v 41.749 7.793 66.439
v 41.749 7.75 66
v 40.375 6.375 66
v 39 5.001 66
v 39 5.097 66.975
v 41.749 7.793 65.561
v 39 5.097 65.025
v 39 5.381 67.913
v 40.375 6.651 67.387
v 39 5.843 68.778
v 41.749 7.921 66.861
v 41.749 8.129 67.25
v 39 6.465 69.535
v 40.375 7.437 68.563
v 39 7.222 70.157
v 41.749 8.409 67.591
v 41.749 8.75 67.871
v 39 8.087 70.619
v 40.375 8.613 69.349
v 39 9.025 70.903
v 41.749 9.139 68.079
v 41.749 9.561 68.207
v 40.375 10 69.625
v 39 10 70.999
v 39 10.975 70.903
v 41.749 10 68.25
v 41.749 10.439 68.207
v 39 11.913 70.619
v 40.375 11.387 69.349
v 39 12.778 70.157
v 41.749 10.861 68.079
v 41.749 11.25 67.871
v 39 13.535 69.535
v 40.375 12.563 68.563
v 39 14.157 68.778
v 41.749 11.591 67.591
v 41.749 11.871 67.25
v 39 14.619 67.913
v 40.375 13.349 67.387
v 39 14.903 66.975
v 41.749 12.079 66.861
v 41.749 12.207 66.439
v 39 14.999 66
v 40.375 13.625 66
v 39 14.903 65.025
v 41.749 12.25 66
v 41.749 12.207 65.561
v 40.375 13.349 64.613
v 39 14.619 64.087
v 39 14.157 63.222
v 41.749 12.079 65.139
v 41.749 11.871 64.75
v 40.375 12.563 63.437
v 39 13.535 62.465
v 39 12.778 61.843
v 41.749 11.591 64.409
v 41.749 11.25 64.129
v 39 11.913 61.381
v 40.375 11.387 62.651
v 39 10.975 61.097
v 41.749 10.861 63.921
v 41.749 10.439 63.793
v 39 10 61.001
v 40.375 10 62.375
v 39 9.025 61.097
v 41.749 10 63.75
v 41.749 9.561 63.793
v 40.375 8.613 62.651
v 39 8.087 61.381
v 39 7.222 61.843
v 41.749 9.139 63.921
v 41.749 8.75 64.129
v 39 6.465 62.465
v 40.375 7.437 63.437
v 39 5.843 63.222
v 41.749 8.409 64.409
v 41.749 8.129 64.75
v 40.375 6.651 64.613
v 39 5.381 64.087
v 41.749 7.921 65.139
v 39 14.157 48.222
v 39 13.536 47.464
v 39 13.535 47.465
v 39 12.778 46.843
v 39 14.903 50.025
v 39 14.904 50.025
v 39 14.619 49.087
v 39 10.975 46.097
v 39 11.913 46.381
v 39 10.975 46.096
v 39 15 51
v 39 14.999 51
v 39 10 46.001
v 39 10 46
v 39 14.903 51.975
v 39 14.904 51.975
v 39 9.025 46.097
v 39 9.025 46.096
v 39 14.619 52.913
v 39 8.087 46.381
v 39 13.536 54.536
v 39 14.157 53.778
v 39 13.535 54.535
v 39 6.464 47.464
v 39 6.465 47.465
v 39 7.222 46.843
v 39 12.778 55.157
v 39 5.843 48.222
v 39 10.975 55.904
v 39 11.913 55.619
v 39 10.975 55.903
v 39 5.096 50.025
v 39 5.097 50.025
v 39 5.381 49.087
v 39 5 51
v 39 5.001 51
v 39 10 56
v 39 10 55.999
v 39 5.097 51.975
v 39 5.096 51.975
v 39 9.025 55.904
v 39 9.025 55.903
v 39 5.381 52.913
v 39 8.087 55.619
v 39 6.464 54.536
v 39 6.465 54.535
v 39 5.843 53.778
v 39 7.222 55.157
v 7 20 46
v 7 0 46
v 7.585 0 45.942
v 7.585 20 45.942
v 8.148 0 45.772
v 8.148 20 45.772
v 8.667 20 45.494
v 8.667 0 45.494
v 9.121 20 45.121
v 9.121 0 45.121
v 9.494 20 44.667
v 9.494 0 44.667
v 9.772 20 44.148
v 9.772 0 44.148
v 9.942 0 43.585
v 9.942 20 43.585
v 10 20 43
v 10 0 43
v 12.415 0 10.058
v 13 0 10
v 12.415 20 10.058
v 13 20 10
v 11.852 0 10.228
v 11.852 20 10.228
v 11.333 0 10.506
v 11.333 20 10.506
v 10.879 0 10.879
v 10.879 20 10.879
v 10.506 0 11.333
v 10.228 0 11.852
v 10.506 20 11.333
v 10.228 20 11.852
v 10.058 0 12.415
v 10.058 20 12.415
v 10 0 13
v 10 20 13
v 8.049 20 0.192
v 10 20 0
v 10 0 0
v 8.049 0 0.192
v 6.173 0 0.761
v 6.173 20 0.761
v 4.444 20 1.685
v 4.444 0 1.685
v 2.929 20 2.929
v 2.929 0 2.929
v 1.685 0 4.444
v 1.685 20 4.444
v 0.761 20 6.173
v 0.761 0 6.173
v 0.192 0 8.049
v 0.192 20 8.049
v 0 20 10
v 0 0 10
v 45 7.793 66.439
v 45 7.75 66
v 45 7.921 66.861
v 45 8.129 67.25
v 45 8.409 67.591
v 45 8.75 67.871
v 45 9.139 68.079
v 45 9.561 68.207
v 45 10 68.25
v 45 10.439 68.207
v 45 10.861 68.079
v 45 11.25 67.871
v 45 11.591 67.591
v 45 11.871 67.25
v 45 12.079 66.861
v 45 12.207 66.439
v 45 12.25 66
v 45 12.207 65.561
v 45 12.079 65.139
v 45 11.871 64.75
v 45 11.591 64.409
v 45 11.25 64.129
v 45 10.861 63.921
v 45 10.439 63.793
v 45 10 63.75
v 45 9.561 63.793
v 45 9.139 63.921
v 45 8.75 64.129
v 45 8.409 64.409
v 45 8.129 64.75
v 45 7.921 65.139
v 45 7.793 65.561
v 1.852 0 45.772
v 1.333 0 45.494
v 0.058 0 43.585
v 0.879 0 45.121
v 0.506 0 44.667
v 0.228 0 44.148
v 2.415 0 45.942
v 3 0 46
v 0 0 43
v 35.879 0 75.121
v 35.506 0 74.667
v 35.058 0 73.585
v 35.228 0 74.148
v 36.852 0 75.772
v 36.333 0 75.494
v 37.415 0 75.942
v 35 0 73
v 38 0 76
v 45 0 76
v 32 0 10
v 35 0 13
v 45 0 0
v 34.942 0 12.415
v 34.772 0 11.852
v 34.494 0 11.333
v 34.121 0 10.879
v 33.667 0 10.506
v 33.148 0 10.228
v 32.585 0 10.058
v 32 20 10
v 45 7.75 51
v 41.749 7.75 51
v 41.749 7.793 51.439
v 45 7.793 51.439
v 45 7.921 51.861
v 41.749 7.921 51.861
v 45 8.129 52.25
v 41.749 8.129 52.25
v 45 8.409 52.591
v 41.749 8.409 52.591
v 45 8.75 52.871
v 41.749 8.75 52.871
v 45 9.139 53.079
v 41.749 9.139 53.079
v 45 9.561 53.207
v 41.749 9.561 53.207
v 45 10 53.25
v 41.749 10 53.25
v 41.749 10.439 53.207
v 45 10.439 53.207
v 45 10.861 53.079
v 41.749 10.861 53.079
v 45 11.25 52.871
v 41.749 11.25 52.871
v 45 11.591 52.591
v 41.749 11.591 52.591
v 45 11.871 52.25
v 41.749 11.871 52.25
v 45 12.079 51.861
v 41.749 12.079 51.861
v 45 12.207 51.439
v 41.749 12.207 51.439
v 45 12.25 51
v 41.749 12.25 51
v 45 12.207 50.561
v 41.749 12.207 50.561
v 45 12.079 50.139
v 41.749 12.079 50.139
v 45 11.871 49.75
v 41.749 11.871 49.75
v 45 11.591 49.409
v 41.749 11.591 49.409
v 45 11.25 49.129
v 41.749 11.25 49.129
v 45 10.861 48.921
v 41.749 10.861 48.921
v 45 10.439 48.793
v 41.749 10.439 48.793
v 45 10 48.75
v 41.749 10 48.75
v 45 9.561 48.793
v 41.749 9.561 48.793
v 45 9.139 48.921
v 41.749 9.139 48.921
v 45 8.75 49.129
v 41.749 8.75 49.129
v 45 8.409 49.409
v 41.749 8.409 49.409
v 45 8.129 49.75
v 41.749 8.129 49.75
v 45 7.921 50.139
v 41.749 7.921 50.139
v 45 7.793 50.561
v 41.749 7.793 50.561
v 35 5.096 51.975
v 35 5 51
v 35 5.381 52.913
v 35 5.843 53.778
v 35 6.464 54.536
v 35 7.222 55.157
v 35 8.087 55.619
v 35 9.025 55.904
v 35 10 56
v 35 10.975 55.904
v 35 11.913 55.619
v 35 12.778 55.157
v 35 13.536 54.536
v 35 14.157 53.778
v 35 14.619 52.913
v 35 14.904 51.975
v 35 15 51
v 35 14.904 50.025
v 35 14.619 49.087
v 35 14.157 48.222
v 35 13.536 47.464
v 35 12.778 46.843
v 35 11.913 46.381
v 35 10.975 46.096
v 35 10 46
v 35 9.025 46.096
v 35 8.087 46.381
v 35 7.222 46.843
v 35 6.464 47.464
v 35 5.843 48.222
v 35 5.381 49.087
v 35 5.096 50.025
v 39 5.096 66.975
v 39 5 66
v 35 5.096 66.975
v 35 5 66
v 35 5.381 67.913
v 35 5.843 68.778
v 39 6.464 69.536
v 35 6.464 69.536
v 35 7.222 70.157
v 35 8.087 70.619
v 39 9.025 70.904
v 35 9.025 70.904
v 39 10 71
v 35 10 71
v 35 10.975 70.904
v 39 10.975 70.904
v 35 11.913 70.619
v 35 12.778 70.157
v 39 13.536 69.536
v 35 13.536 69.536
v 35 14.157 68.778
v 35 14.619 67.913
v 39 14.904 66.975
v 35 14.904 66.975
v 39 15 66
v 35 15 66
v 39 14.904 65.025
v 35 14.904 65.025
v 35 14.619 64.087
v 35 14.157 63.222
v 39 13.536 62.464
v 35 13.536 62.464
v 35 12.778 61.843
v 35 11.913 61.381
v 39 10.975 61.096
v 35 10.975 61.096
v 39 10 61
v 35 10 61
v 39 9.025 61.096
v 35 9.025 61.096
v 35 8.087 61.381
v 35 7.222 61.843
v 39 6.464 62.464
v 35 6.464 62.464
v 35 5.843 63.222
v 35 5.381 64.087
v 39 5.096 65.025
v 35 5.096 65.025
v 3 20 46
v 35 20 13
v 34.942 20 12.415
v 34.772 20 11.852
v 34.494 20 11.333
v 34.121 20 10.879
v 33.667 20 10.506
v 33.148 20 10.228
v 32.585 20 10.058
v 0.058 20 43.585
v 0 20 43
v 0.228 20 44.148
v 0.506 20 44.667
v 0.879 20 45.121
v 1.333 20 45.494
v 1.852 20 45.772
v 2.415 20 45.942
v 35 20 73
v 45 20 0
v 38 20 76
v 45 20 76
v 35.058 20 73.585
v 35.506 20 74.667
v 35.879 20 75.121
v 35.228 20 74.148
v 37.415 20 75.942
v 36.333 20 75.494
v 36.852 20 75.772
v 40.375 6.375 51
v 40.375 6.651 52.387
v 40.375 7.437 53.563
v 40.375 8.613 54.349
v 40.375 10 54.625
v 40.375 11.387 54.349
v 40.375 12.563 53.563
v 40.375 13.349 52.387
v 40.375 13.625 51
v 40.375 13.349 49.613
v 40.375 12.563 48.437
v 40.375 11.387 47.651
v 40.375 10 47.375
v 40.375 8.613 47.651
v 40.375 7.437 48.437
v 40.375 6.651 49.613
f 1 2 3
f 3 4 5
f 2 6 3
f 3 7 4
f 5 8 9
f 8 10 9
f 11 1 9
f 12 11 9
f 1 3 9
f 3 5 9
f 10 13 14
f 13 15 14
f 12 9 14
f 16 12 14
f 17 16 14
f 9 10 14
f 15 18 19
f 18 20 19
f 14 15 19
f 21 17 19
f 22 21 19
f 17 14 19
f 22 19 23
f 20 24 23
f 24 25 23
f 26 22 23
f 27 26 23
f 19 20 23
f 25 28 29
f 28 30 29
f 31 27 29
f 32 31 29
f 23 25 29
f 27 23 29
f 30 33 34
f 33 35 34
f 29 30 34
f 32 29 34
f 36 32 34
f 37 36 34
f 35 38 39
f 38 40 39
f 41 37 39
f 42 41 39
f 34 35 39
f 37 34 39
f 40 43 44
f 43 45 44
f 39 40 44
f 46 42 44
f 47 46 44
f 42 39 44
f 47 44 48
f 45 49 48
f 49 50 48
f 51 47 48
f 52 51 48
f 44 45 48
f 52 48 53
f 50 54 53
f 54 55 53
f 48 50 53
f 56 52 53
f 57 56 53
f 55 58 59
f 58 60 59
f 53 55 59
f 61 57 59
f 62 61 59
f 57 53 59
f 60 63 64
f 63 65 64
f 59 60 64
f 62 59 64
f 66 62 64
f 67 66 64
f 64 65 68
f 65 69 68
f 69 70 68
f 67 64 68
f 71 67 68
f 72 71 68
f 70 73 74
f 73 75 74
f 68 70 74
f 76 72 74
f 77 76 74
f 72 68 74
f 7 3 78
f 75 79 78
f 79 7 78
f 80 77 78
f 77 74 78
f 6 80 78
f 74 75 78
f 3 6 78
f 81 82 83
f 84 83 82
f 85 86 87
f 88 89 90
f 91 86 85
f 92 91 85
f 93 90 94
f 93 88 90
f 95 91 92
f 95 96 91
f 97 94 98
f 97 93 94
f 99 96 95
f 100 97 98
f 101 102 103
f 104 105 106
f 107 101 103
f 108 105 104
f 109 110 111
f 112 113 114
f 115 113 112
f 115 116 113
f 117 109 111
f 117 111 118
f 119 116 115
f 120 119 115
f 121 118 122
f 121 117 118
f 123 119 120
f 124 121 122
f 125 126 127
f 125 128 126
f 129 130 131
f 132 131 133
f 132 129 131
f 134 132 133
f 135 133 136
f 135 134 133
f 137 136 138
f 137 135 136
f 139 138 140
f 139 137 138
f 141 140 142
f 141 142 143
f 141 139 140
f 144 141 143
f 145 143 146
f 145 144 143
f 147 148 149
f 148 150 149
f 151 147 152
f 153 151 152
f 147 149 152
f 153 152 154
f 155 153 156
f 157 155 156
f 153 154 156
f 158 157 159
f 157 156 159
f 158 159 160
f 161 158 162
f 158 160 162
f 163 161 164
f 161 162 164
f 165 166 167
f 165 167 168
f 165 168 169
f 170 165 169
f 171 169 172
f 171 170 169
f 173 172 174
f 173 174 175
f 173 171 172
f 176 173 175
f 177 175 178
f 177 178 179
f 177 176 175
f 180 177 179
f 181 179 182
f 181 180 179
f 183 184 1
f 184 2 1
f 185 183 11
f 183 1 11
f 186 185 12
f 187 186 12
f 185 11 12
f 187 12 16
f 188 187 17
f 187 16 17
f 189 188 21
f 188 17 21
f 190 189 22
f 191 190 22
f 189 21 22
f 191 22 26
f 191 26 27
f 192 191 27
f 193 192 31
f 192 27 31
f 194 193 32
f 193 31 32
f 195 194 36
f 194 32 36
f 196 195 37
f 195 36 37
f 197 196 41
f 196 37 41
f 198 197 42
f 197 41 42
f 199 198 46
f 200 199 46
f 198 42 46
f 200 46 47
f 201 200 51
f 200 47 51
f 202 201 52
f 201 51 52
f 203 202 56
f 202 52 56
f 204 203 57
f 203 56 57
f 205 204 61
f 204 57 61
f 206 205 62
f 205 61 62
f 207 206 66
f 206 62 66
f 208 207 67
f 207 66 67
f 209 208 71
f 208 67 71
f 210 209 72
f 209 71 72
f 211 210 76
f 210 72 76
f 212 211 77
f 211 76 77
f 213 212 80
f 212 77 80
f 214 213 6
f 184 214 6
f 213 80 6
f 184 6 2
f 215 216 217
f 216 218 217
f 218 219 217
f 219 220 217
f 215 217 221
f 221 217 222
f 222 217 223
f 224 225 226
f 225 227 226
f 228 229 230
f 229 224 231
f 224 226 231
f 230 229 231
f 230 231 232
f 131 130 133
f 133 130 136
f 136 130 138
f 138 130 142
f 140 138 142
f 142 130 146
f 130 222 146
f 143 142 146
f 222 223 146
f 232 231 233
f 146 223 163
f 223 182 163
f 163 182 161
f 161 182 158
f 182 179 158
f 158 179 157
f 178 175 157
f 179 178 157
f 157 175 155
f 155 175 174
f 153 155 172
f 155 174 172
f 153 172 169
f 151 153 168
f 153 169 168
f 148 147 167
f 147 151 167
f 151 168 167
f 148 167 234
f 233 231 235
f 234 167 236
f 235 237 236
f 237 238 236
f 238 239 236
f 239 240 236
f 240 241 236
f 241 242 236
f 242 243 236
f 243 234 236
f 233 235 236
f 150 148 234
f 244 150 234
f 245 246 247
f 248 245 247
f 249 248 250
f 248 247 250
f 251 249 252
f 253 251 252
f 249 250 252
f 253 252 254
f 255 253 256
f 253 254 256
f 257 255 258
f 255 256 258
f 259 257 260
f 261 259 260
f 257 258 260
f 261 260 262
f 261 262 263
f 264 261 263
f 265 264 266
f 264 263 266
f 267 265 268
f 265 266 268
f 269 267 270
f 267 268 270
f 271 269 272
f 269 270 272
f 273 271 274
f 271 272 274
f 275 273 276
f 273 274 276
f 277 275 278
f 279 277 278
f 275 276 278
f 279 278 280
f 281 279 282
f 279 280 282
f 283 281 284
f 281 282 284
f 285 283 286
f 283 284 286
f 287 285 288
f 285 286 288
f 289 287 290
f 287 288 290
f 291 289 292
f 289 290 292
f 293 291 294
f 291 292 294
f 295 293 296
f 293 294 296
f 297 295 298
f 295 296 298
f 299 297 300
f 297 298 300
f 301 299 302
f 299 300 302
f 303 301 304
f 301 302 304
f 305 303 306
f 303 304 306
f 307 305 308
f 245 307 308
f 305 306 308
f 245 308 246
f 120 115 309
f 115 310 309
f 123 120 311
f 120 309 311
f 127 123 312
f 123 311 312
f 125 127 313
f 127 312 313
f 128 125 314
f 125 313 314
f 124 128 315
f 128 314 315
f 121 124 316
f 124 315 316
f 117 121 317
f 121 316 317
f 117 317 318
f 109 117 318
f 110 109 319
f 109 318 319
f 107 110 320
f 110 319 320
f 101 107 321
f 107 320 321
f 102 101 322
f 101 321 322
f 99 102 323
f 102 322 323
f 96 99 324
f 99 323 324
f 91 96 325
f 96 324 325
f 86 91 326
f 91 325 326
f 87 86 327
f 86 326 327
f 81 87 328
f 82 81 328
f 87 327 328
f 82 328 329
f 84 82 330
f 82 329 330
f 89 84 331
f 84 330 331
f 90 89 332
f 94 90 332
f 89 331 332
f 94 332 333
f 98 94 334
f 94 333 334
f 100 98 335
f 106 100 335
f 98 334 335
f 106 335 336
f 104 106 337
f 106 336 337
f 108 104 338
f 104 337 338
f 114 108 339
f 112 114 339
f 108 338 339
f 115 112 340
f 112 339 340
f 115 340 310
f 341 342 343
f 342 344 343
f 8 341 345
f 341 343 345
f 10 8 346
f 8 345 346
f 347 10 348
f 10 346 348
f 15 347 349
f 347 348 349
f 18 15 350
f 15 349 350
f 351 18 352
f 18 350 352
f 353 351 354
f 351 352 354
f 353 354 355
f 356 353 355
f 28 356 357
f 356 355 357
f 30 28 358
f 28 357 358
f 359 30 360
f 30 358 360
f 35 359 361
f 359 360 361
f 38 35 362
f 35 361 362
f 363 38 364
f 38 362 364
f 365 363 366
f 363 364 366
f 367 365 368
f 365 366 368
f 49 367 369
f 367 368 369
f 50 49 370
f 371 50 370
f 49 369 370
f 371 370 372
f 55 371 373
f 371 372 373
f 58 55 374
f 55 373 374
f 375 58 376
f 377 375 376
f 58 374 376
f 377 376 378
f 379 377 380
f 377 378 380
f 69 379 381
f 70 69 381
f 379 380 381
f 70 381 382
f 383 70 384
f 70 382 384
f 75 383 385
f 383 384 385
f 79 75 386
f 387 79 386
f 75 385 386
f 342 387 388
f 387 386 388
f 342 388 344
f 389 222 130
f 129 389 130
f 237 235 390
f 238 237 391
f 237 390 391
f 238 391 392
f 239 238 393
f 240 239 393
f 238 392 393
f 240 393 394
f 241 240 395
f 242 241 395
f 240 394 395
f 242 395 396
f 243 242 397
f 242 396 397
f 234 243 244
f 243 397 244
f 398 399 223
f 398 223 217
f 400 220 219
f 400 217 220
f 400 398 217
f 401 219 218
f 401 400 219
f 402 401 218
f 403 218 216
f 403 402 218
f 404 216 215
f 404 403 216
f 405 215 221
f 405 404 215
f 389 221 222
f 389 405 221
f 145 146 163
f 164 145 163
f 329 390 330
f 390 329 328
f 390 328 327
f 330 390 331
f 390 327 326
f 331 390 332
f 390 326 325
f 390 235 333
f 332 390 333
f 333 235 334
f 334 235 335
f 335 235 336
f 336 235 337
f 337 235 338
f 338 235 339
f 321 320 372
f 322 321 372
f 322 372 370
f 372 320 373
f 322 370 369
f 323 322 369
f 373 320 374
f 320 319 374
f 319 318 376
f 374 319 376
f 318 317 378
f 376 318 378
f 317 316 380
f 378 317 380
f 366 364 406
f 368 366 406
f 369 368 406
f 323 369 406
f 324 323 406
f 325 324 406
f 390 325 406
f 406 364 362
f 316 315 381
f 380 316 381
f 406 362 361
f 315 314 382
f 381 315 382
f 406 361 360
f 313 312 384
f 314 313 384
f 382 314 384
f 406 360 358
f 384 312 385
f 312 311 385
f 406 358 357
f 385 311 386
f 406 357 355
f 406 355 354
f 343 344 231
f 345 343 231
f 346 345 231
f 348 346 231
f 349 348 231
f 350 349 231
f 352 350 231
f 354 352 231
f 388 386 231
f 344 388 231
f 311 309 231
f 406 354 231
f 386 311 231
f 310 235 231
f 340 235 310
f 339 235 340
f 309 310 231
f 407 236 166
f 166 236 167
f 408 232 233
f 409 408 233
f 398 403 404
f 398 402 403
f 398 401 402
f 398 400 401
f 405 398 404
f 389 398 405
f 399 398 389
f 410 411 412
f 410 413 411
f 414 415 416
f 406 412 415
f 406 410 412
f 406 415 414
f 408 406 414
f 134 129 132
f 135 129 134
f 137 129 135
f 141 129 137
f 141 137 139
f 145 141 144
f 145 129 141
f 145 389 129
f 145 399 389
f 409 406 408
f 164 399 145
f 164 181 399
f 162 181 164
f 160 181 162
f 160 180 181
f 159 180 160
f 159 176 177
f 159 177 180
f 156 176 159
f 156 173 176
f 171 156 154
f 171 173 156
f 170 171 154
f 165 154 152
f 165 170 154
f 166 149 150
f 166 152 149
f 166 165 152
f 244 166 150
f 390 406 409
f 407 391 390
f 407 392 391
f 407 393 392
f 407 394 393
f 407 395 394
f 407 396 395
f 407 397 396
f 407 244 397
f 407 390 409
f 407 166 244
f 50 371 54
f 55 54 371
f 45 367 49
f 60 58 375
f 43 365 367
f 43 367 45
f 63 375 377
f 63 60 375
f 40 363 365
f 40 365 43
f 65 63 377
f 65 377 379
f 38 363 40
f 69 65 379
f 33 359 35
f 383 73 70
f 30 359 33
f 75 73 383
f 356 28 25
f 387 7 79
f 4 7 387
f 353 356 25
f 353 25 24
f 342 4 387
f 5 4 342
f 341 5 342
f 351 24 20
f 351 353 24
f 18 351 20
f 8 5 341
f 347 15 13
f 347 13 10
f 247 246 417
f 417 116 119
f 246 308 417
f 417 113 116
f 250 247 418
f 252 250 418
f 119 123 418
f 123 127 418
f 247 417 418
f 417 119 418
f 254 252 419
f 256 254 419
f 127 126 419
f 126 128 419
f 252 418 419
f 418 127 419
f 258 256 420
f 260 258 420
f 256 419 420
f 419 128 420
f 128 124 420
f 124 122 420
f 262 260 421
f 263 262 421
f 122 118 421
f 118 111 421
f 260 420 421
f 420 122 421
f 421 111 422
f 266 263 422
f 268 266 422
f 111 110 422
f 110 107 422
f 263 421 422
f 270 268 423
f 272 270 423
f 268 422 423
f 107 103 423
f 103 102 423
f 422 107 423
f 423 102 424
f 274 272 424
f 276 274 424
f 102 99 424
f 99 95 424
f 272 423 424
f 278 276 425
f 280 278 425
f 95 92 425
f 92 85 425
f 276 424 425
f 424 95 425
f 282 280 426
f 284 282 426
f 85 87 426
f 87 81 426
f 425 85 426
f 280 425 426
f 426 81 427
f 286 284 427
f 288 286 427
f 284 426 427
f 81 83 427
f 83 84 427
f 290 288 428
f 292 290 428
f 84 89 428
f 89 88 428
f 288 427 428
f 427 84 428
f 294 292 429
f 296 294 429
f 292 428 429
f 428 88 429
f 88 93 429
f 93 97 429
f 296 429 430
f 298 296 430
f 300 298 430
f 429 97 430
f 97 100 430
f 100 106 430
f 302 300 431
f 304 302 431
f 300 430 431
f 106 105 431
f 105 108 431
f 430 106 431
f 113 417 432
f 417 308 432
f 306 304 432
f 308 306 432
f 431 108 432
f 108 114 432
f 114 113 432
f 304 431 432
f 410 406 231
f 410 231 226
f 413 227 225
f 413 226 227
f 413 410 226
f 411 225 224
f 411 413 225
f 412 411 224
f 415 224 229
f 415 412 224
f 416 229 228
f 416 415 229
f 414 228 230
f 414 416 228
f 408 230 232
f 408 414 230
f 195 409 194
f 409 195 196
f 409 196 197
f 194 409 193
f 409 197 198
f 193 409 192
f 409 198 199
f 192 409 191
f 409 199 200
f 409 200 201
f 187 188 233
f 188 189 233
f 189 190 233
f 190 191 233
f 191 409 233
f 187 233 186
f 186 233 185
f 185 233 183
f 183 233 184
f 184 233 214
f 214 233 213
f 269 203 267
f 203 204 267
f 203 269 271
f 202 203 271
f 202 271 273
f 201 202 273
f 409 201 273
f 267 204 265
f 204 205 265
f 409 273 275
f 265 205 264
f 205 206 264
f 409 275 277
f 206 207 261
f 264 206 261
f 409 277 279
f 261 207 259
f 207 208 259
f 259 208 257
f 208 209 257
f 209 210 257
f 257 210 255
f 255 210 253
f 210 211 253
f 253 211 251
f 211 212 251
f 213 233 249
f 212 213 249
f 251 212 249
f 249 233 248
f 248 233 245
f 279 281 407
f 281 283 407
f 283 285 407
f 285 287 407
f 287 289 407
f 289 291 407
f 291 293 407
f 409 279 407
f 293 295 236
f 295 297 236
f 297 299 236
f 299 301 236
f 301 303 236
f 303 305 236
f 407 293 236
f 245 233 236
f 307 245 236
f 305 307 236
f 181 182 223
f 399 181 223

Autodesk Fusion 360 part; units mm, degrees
sketch "Sketch1" plane through (0, 0, 0) normal (0, 1, 0) x (1, 0, 0)
  line L0 (10, -46) -> (10, -10)
  line L1 (10, -10) -> (35, -10)
  line L2 (35, -10) -> (35, -76)
  line L3 (35, -76) -> (45, -76)
  line L4 (45, -76) -> (45, 0)
  line L5 (45, 0) -> (0, 0)
  line L6 (0, 0) -> (0, -46)
  line L7 (0, -46) -> (10, -46)
  dimension "d1" = 36
  dimension "d2" = 25
  dimension "d3" = 10
  dimension "d4" = 10
  dimension "d5" = 10
  dimension "d6" = 30
extrude "Extrude1" add sketch "Sketch1" along normal blind 20
sketch "Sketch2" plane through (35, 0, 0) normal (-1, 0, 0) x (0, -1, 0)
  line L0 (0, 10) -> (0, 76)
  line L1 (0, 76) -> (-20, 76)
  line L2 (-20, 76) -> (-20, 10)
  line L3 (-20, 10) -> (0, 10)
  circle A0 centre (-10, 66) radius 5
  circle A1 centre (-10, 51) radius 5
  line L4 (-20, 76) -> (-10, 66) construction
  line L5 (-10, 66) -> (0, 76) construction
  line L6 (-10, 66) -> (-10, 51) construction
  circle A2 centre (-10, 66) radius 2.25
  circle A3 centre (-10, 51) radius 2.25
  dimension "d9" = 10
  dimension "d11" = 15
  dimension "d12" = 10
  dimension "d13" = 10
  dimension "d14" = 4.5
  dimension "d15" = 4.5
extrude "Extrude2" cut sketch "Sketch2" against normal up to surface (10 mm away) contours A2 | A3
extrude "Extrude3" cut sketch "Sketch2" against normal blind 4 contours A0 | A1
chamfer "Chamfer1" distance 2.75 angle 45 2 edges at (39, 12.0977, 65.1864) (39, 12.0977, 50.1864)
fillet "Fillet2" radius 3 5 edges at (35, 10, 76) (35, 10, 10) (10, 10, 10) (10, 10, 46) (0, 10, 46)
fillet "Fillet2" radius 10 1 edges at (0, 10, 0)
equation "d13 = d9"
equation "d15 = d14"
